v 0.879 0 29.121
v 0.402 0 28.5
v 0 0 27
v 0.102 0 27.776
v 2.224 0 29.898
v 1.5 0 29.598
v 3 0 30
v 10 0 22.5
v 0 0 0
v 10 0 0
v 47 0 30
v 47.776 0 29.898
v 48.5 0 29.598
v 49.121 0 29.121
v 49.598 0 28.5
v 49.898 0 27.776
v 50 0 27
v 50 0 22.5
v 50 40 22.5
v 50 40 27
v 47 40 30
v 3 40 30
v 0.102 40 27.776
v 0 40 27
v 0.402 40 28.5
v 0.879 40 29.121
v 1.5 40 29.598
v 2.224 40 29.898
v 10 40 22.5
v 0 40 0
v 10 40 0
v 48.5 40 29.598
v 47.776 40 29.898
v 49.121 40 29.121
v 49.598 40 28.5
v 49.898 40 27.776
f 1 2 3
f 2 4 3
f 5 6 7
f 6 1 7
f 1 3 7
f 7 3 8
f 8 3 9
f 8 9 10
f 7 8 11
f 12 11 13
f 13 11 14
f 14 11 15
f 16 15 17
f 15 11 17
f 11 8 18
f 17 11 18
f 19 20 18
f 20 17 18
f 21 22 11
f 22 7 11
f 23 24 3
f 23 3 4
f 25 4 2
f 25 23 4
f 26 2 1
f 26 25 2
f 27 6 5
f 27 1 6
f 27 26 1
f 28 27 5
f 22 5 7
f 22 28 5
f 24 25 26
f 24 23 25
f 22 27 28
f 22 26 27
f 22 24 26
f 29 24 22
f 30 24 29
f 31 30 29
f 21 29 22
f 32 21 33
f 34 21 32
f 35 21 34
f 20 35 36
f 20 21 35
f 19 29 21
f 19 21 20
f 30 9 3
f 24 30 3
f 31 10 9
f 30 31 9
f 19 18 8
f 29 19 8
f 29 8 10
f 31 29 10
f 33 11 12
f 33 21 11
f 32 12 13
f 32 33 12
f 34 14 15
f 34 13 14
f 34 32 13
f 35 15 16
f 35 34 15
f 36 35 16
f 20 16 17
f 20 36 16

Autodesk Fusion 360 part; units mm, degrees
sketch "Sketch1" plane through (0, 0, 0) normal (0, 1, 0) x (1, 0, 0)
  line L0 (0, 0) -> (0, -30)
  line L1 (0, -30) -> (50, -30)
  line L2 (50, -30) -> (50, -22.5)
  line L3 (50, -22.5) -> (10, -22.5)
  line L4 (10, -22.5) -> (10, 0)
  line L5 (10, 0) -> (0, 0)
  dimension "d1" = 10
  dimension "d2" = 30
  dimension "d3" = 50
  dimension "d9" = 7.5
extrude "Extrude1" add sketch "Sketch1" along normal blind 40
sketch "Sketch2" plane through (10, 0, 0) normal (1, 0, 0) x (0, 1, 0)
  line L0 (0, 22.5) -> (0, 0)
  line L1 (0, 0) -> (40, 0)
  line L2 (40, 0) -> (40, 22.5)
  line L3 (40, 22.5) -> (0, 22.5)
  line L4 (23.25, 15) -> (23.25, 7.5)
  line L5 (16.75, 7.5) -> (16.75, 15)
  arc A0 (23.25, 15) -> (16.75, 15) centre (20, 15) ccw
  arc A1 (16.75, 7.5) -> (23.25, 7.5) centre (20, 7.5) ccw
  line L6 (0, 0) -> (40, 22.5) construction
  line L7 (20, 15) -> (20, 7.5) construction
  dimension "d6" = 6.5
  dimension "d7" = 7.5
extrude "Extrude2" cut sketch "Sketch2" along normal through all contours L4 L5 A0 A1
fillet "Fillet1" radius 3 2 edges at (0, 20, 30) (50, 20, 30)
